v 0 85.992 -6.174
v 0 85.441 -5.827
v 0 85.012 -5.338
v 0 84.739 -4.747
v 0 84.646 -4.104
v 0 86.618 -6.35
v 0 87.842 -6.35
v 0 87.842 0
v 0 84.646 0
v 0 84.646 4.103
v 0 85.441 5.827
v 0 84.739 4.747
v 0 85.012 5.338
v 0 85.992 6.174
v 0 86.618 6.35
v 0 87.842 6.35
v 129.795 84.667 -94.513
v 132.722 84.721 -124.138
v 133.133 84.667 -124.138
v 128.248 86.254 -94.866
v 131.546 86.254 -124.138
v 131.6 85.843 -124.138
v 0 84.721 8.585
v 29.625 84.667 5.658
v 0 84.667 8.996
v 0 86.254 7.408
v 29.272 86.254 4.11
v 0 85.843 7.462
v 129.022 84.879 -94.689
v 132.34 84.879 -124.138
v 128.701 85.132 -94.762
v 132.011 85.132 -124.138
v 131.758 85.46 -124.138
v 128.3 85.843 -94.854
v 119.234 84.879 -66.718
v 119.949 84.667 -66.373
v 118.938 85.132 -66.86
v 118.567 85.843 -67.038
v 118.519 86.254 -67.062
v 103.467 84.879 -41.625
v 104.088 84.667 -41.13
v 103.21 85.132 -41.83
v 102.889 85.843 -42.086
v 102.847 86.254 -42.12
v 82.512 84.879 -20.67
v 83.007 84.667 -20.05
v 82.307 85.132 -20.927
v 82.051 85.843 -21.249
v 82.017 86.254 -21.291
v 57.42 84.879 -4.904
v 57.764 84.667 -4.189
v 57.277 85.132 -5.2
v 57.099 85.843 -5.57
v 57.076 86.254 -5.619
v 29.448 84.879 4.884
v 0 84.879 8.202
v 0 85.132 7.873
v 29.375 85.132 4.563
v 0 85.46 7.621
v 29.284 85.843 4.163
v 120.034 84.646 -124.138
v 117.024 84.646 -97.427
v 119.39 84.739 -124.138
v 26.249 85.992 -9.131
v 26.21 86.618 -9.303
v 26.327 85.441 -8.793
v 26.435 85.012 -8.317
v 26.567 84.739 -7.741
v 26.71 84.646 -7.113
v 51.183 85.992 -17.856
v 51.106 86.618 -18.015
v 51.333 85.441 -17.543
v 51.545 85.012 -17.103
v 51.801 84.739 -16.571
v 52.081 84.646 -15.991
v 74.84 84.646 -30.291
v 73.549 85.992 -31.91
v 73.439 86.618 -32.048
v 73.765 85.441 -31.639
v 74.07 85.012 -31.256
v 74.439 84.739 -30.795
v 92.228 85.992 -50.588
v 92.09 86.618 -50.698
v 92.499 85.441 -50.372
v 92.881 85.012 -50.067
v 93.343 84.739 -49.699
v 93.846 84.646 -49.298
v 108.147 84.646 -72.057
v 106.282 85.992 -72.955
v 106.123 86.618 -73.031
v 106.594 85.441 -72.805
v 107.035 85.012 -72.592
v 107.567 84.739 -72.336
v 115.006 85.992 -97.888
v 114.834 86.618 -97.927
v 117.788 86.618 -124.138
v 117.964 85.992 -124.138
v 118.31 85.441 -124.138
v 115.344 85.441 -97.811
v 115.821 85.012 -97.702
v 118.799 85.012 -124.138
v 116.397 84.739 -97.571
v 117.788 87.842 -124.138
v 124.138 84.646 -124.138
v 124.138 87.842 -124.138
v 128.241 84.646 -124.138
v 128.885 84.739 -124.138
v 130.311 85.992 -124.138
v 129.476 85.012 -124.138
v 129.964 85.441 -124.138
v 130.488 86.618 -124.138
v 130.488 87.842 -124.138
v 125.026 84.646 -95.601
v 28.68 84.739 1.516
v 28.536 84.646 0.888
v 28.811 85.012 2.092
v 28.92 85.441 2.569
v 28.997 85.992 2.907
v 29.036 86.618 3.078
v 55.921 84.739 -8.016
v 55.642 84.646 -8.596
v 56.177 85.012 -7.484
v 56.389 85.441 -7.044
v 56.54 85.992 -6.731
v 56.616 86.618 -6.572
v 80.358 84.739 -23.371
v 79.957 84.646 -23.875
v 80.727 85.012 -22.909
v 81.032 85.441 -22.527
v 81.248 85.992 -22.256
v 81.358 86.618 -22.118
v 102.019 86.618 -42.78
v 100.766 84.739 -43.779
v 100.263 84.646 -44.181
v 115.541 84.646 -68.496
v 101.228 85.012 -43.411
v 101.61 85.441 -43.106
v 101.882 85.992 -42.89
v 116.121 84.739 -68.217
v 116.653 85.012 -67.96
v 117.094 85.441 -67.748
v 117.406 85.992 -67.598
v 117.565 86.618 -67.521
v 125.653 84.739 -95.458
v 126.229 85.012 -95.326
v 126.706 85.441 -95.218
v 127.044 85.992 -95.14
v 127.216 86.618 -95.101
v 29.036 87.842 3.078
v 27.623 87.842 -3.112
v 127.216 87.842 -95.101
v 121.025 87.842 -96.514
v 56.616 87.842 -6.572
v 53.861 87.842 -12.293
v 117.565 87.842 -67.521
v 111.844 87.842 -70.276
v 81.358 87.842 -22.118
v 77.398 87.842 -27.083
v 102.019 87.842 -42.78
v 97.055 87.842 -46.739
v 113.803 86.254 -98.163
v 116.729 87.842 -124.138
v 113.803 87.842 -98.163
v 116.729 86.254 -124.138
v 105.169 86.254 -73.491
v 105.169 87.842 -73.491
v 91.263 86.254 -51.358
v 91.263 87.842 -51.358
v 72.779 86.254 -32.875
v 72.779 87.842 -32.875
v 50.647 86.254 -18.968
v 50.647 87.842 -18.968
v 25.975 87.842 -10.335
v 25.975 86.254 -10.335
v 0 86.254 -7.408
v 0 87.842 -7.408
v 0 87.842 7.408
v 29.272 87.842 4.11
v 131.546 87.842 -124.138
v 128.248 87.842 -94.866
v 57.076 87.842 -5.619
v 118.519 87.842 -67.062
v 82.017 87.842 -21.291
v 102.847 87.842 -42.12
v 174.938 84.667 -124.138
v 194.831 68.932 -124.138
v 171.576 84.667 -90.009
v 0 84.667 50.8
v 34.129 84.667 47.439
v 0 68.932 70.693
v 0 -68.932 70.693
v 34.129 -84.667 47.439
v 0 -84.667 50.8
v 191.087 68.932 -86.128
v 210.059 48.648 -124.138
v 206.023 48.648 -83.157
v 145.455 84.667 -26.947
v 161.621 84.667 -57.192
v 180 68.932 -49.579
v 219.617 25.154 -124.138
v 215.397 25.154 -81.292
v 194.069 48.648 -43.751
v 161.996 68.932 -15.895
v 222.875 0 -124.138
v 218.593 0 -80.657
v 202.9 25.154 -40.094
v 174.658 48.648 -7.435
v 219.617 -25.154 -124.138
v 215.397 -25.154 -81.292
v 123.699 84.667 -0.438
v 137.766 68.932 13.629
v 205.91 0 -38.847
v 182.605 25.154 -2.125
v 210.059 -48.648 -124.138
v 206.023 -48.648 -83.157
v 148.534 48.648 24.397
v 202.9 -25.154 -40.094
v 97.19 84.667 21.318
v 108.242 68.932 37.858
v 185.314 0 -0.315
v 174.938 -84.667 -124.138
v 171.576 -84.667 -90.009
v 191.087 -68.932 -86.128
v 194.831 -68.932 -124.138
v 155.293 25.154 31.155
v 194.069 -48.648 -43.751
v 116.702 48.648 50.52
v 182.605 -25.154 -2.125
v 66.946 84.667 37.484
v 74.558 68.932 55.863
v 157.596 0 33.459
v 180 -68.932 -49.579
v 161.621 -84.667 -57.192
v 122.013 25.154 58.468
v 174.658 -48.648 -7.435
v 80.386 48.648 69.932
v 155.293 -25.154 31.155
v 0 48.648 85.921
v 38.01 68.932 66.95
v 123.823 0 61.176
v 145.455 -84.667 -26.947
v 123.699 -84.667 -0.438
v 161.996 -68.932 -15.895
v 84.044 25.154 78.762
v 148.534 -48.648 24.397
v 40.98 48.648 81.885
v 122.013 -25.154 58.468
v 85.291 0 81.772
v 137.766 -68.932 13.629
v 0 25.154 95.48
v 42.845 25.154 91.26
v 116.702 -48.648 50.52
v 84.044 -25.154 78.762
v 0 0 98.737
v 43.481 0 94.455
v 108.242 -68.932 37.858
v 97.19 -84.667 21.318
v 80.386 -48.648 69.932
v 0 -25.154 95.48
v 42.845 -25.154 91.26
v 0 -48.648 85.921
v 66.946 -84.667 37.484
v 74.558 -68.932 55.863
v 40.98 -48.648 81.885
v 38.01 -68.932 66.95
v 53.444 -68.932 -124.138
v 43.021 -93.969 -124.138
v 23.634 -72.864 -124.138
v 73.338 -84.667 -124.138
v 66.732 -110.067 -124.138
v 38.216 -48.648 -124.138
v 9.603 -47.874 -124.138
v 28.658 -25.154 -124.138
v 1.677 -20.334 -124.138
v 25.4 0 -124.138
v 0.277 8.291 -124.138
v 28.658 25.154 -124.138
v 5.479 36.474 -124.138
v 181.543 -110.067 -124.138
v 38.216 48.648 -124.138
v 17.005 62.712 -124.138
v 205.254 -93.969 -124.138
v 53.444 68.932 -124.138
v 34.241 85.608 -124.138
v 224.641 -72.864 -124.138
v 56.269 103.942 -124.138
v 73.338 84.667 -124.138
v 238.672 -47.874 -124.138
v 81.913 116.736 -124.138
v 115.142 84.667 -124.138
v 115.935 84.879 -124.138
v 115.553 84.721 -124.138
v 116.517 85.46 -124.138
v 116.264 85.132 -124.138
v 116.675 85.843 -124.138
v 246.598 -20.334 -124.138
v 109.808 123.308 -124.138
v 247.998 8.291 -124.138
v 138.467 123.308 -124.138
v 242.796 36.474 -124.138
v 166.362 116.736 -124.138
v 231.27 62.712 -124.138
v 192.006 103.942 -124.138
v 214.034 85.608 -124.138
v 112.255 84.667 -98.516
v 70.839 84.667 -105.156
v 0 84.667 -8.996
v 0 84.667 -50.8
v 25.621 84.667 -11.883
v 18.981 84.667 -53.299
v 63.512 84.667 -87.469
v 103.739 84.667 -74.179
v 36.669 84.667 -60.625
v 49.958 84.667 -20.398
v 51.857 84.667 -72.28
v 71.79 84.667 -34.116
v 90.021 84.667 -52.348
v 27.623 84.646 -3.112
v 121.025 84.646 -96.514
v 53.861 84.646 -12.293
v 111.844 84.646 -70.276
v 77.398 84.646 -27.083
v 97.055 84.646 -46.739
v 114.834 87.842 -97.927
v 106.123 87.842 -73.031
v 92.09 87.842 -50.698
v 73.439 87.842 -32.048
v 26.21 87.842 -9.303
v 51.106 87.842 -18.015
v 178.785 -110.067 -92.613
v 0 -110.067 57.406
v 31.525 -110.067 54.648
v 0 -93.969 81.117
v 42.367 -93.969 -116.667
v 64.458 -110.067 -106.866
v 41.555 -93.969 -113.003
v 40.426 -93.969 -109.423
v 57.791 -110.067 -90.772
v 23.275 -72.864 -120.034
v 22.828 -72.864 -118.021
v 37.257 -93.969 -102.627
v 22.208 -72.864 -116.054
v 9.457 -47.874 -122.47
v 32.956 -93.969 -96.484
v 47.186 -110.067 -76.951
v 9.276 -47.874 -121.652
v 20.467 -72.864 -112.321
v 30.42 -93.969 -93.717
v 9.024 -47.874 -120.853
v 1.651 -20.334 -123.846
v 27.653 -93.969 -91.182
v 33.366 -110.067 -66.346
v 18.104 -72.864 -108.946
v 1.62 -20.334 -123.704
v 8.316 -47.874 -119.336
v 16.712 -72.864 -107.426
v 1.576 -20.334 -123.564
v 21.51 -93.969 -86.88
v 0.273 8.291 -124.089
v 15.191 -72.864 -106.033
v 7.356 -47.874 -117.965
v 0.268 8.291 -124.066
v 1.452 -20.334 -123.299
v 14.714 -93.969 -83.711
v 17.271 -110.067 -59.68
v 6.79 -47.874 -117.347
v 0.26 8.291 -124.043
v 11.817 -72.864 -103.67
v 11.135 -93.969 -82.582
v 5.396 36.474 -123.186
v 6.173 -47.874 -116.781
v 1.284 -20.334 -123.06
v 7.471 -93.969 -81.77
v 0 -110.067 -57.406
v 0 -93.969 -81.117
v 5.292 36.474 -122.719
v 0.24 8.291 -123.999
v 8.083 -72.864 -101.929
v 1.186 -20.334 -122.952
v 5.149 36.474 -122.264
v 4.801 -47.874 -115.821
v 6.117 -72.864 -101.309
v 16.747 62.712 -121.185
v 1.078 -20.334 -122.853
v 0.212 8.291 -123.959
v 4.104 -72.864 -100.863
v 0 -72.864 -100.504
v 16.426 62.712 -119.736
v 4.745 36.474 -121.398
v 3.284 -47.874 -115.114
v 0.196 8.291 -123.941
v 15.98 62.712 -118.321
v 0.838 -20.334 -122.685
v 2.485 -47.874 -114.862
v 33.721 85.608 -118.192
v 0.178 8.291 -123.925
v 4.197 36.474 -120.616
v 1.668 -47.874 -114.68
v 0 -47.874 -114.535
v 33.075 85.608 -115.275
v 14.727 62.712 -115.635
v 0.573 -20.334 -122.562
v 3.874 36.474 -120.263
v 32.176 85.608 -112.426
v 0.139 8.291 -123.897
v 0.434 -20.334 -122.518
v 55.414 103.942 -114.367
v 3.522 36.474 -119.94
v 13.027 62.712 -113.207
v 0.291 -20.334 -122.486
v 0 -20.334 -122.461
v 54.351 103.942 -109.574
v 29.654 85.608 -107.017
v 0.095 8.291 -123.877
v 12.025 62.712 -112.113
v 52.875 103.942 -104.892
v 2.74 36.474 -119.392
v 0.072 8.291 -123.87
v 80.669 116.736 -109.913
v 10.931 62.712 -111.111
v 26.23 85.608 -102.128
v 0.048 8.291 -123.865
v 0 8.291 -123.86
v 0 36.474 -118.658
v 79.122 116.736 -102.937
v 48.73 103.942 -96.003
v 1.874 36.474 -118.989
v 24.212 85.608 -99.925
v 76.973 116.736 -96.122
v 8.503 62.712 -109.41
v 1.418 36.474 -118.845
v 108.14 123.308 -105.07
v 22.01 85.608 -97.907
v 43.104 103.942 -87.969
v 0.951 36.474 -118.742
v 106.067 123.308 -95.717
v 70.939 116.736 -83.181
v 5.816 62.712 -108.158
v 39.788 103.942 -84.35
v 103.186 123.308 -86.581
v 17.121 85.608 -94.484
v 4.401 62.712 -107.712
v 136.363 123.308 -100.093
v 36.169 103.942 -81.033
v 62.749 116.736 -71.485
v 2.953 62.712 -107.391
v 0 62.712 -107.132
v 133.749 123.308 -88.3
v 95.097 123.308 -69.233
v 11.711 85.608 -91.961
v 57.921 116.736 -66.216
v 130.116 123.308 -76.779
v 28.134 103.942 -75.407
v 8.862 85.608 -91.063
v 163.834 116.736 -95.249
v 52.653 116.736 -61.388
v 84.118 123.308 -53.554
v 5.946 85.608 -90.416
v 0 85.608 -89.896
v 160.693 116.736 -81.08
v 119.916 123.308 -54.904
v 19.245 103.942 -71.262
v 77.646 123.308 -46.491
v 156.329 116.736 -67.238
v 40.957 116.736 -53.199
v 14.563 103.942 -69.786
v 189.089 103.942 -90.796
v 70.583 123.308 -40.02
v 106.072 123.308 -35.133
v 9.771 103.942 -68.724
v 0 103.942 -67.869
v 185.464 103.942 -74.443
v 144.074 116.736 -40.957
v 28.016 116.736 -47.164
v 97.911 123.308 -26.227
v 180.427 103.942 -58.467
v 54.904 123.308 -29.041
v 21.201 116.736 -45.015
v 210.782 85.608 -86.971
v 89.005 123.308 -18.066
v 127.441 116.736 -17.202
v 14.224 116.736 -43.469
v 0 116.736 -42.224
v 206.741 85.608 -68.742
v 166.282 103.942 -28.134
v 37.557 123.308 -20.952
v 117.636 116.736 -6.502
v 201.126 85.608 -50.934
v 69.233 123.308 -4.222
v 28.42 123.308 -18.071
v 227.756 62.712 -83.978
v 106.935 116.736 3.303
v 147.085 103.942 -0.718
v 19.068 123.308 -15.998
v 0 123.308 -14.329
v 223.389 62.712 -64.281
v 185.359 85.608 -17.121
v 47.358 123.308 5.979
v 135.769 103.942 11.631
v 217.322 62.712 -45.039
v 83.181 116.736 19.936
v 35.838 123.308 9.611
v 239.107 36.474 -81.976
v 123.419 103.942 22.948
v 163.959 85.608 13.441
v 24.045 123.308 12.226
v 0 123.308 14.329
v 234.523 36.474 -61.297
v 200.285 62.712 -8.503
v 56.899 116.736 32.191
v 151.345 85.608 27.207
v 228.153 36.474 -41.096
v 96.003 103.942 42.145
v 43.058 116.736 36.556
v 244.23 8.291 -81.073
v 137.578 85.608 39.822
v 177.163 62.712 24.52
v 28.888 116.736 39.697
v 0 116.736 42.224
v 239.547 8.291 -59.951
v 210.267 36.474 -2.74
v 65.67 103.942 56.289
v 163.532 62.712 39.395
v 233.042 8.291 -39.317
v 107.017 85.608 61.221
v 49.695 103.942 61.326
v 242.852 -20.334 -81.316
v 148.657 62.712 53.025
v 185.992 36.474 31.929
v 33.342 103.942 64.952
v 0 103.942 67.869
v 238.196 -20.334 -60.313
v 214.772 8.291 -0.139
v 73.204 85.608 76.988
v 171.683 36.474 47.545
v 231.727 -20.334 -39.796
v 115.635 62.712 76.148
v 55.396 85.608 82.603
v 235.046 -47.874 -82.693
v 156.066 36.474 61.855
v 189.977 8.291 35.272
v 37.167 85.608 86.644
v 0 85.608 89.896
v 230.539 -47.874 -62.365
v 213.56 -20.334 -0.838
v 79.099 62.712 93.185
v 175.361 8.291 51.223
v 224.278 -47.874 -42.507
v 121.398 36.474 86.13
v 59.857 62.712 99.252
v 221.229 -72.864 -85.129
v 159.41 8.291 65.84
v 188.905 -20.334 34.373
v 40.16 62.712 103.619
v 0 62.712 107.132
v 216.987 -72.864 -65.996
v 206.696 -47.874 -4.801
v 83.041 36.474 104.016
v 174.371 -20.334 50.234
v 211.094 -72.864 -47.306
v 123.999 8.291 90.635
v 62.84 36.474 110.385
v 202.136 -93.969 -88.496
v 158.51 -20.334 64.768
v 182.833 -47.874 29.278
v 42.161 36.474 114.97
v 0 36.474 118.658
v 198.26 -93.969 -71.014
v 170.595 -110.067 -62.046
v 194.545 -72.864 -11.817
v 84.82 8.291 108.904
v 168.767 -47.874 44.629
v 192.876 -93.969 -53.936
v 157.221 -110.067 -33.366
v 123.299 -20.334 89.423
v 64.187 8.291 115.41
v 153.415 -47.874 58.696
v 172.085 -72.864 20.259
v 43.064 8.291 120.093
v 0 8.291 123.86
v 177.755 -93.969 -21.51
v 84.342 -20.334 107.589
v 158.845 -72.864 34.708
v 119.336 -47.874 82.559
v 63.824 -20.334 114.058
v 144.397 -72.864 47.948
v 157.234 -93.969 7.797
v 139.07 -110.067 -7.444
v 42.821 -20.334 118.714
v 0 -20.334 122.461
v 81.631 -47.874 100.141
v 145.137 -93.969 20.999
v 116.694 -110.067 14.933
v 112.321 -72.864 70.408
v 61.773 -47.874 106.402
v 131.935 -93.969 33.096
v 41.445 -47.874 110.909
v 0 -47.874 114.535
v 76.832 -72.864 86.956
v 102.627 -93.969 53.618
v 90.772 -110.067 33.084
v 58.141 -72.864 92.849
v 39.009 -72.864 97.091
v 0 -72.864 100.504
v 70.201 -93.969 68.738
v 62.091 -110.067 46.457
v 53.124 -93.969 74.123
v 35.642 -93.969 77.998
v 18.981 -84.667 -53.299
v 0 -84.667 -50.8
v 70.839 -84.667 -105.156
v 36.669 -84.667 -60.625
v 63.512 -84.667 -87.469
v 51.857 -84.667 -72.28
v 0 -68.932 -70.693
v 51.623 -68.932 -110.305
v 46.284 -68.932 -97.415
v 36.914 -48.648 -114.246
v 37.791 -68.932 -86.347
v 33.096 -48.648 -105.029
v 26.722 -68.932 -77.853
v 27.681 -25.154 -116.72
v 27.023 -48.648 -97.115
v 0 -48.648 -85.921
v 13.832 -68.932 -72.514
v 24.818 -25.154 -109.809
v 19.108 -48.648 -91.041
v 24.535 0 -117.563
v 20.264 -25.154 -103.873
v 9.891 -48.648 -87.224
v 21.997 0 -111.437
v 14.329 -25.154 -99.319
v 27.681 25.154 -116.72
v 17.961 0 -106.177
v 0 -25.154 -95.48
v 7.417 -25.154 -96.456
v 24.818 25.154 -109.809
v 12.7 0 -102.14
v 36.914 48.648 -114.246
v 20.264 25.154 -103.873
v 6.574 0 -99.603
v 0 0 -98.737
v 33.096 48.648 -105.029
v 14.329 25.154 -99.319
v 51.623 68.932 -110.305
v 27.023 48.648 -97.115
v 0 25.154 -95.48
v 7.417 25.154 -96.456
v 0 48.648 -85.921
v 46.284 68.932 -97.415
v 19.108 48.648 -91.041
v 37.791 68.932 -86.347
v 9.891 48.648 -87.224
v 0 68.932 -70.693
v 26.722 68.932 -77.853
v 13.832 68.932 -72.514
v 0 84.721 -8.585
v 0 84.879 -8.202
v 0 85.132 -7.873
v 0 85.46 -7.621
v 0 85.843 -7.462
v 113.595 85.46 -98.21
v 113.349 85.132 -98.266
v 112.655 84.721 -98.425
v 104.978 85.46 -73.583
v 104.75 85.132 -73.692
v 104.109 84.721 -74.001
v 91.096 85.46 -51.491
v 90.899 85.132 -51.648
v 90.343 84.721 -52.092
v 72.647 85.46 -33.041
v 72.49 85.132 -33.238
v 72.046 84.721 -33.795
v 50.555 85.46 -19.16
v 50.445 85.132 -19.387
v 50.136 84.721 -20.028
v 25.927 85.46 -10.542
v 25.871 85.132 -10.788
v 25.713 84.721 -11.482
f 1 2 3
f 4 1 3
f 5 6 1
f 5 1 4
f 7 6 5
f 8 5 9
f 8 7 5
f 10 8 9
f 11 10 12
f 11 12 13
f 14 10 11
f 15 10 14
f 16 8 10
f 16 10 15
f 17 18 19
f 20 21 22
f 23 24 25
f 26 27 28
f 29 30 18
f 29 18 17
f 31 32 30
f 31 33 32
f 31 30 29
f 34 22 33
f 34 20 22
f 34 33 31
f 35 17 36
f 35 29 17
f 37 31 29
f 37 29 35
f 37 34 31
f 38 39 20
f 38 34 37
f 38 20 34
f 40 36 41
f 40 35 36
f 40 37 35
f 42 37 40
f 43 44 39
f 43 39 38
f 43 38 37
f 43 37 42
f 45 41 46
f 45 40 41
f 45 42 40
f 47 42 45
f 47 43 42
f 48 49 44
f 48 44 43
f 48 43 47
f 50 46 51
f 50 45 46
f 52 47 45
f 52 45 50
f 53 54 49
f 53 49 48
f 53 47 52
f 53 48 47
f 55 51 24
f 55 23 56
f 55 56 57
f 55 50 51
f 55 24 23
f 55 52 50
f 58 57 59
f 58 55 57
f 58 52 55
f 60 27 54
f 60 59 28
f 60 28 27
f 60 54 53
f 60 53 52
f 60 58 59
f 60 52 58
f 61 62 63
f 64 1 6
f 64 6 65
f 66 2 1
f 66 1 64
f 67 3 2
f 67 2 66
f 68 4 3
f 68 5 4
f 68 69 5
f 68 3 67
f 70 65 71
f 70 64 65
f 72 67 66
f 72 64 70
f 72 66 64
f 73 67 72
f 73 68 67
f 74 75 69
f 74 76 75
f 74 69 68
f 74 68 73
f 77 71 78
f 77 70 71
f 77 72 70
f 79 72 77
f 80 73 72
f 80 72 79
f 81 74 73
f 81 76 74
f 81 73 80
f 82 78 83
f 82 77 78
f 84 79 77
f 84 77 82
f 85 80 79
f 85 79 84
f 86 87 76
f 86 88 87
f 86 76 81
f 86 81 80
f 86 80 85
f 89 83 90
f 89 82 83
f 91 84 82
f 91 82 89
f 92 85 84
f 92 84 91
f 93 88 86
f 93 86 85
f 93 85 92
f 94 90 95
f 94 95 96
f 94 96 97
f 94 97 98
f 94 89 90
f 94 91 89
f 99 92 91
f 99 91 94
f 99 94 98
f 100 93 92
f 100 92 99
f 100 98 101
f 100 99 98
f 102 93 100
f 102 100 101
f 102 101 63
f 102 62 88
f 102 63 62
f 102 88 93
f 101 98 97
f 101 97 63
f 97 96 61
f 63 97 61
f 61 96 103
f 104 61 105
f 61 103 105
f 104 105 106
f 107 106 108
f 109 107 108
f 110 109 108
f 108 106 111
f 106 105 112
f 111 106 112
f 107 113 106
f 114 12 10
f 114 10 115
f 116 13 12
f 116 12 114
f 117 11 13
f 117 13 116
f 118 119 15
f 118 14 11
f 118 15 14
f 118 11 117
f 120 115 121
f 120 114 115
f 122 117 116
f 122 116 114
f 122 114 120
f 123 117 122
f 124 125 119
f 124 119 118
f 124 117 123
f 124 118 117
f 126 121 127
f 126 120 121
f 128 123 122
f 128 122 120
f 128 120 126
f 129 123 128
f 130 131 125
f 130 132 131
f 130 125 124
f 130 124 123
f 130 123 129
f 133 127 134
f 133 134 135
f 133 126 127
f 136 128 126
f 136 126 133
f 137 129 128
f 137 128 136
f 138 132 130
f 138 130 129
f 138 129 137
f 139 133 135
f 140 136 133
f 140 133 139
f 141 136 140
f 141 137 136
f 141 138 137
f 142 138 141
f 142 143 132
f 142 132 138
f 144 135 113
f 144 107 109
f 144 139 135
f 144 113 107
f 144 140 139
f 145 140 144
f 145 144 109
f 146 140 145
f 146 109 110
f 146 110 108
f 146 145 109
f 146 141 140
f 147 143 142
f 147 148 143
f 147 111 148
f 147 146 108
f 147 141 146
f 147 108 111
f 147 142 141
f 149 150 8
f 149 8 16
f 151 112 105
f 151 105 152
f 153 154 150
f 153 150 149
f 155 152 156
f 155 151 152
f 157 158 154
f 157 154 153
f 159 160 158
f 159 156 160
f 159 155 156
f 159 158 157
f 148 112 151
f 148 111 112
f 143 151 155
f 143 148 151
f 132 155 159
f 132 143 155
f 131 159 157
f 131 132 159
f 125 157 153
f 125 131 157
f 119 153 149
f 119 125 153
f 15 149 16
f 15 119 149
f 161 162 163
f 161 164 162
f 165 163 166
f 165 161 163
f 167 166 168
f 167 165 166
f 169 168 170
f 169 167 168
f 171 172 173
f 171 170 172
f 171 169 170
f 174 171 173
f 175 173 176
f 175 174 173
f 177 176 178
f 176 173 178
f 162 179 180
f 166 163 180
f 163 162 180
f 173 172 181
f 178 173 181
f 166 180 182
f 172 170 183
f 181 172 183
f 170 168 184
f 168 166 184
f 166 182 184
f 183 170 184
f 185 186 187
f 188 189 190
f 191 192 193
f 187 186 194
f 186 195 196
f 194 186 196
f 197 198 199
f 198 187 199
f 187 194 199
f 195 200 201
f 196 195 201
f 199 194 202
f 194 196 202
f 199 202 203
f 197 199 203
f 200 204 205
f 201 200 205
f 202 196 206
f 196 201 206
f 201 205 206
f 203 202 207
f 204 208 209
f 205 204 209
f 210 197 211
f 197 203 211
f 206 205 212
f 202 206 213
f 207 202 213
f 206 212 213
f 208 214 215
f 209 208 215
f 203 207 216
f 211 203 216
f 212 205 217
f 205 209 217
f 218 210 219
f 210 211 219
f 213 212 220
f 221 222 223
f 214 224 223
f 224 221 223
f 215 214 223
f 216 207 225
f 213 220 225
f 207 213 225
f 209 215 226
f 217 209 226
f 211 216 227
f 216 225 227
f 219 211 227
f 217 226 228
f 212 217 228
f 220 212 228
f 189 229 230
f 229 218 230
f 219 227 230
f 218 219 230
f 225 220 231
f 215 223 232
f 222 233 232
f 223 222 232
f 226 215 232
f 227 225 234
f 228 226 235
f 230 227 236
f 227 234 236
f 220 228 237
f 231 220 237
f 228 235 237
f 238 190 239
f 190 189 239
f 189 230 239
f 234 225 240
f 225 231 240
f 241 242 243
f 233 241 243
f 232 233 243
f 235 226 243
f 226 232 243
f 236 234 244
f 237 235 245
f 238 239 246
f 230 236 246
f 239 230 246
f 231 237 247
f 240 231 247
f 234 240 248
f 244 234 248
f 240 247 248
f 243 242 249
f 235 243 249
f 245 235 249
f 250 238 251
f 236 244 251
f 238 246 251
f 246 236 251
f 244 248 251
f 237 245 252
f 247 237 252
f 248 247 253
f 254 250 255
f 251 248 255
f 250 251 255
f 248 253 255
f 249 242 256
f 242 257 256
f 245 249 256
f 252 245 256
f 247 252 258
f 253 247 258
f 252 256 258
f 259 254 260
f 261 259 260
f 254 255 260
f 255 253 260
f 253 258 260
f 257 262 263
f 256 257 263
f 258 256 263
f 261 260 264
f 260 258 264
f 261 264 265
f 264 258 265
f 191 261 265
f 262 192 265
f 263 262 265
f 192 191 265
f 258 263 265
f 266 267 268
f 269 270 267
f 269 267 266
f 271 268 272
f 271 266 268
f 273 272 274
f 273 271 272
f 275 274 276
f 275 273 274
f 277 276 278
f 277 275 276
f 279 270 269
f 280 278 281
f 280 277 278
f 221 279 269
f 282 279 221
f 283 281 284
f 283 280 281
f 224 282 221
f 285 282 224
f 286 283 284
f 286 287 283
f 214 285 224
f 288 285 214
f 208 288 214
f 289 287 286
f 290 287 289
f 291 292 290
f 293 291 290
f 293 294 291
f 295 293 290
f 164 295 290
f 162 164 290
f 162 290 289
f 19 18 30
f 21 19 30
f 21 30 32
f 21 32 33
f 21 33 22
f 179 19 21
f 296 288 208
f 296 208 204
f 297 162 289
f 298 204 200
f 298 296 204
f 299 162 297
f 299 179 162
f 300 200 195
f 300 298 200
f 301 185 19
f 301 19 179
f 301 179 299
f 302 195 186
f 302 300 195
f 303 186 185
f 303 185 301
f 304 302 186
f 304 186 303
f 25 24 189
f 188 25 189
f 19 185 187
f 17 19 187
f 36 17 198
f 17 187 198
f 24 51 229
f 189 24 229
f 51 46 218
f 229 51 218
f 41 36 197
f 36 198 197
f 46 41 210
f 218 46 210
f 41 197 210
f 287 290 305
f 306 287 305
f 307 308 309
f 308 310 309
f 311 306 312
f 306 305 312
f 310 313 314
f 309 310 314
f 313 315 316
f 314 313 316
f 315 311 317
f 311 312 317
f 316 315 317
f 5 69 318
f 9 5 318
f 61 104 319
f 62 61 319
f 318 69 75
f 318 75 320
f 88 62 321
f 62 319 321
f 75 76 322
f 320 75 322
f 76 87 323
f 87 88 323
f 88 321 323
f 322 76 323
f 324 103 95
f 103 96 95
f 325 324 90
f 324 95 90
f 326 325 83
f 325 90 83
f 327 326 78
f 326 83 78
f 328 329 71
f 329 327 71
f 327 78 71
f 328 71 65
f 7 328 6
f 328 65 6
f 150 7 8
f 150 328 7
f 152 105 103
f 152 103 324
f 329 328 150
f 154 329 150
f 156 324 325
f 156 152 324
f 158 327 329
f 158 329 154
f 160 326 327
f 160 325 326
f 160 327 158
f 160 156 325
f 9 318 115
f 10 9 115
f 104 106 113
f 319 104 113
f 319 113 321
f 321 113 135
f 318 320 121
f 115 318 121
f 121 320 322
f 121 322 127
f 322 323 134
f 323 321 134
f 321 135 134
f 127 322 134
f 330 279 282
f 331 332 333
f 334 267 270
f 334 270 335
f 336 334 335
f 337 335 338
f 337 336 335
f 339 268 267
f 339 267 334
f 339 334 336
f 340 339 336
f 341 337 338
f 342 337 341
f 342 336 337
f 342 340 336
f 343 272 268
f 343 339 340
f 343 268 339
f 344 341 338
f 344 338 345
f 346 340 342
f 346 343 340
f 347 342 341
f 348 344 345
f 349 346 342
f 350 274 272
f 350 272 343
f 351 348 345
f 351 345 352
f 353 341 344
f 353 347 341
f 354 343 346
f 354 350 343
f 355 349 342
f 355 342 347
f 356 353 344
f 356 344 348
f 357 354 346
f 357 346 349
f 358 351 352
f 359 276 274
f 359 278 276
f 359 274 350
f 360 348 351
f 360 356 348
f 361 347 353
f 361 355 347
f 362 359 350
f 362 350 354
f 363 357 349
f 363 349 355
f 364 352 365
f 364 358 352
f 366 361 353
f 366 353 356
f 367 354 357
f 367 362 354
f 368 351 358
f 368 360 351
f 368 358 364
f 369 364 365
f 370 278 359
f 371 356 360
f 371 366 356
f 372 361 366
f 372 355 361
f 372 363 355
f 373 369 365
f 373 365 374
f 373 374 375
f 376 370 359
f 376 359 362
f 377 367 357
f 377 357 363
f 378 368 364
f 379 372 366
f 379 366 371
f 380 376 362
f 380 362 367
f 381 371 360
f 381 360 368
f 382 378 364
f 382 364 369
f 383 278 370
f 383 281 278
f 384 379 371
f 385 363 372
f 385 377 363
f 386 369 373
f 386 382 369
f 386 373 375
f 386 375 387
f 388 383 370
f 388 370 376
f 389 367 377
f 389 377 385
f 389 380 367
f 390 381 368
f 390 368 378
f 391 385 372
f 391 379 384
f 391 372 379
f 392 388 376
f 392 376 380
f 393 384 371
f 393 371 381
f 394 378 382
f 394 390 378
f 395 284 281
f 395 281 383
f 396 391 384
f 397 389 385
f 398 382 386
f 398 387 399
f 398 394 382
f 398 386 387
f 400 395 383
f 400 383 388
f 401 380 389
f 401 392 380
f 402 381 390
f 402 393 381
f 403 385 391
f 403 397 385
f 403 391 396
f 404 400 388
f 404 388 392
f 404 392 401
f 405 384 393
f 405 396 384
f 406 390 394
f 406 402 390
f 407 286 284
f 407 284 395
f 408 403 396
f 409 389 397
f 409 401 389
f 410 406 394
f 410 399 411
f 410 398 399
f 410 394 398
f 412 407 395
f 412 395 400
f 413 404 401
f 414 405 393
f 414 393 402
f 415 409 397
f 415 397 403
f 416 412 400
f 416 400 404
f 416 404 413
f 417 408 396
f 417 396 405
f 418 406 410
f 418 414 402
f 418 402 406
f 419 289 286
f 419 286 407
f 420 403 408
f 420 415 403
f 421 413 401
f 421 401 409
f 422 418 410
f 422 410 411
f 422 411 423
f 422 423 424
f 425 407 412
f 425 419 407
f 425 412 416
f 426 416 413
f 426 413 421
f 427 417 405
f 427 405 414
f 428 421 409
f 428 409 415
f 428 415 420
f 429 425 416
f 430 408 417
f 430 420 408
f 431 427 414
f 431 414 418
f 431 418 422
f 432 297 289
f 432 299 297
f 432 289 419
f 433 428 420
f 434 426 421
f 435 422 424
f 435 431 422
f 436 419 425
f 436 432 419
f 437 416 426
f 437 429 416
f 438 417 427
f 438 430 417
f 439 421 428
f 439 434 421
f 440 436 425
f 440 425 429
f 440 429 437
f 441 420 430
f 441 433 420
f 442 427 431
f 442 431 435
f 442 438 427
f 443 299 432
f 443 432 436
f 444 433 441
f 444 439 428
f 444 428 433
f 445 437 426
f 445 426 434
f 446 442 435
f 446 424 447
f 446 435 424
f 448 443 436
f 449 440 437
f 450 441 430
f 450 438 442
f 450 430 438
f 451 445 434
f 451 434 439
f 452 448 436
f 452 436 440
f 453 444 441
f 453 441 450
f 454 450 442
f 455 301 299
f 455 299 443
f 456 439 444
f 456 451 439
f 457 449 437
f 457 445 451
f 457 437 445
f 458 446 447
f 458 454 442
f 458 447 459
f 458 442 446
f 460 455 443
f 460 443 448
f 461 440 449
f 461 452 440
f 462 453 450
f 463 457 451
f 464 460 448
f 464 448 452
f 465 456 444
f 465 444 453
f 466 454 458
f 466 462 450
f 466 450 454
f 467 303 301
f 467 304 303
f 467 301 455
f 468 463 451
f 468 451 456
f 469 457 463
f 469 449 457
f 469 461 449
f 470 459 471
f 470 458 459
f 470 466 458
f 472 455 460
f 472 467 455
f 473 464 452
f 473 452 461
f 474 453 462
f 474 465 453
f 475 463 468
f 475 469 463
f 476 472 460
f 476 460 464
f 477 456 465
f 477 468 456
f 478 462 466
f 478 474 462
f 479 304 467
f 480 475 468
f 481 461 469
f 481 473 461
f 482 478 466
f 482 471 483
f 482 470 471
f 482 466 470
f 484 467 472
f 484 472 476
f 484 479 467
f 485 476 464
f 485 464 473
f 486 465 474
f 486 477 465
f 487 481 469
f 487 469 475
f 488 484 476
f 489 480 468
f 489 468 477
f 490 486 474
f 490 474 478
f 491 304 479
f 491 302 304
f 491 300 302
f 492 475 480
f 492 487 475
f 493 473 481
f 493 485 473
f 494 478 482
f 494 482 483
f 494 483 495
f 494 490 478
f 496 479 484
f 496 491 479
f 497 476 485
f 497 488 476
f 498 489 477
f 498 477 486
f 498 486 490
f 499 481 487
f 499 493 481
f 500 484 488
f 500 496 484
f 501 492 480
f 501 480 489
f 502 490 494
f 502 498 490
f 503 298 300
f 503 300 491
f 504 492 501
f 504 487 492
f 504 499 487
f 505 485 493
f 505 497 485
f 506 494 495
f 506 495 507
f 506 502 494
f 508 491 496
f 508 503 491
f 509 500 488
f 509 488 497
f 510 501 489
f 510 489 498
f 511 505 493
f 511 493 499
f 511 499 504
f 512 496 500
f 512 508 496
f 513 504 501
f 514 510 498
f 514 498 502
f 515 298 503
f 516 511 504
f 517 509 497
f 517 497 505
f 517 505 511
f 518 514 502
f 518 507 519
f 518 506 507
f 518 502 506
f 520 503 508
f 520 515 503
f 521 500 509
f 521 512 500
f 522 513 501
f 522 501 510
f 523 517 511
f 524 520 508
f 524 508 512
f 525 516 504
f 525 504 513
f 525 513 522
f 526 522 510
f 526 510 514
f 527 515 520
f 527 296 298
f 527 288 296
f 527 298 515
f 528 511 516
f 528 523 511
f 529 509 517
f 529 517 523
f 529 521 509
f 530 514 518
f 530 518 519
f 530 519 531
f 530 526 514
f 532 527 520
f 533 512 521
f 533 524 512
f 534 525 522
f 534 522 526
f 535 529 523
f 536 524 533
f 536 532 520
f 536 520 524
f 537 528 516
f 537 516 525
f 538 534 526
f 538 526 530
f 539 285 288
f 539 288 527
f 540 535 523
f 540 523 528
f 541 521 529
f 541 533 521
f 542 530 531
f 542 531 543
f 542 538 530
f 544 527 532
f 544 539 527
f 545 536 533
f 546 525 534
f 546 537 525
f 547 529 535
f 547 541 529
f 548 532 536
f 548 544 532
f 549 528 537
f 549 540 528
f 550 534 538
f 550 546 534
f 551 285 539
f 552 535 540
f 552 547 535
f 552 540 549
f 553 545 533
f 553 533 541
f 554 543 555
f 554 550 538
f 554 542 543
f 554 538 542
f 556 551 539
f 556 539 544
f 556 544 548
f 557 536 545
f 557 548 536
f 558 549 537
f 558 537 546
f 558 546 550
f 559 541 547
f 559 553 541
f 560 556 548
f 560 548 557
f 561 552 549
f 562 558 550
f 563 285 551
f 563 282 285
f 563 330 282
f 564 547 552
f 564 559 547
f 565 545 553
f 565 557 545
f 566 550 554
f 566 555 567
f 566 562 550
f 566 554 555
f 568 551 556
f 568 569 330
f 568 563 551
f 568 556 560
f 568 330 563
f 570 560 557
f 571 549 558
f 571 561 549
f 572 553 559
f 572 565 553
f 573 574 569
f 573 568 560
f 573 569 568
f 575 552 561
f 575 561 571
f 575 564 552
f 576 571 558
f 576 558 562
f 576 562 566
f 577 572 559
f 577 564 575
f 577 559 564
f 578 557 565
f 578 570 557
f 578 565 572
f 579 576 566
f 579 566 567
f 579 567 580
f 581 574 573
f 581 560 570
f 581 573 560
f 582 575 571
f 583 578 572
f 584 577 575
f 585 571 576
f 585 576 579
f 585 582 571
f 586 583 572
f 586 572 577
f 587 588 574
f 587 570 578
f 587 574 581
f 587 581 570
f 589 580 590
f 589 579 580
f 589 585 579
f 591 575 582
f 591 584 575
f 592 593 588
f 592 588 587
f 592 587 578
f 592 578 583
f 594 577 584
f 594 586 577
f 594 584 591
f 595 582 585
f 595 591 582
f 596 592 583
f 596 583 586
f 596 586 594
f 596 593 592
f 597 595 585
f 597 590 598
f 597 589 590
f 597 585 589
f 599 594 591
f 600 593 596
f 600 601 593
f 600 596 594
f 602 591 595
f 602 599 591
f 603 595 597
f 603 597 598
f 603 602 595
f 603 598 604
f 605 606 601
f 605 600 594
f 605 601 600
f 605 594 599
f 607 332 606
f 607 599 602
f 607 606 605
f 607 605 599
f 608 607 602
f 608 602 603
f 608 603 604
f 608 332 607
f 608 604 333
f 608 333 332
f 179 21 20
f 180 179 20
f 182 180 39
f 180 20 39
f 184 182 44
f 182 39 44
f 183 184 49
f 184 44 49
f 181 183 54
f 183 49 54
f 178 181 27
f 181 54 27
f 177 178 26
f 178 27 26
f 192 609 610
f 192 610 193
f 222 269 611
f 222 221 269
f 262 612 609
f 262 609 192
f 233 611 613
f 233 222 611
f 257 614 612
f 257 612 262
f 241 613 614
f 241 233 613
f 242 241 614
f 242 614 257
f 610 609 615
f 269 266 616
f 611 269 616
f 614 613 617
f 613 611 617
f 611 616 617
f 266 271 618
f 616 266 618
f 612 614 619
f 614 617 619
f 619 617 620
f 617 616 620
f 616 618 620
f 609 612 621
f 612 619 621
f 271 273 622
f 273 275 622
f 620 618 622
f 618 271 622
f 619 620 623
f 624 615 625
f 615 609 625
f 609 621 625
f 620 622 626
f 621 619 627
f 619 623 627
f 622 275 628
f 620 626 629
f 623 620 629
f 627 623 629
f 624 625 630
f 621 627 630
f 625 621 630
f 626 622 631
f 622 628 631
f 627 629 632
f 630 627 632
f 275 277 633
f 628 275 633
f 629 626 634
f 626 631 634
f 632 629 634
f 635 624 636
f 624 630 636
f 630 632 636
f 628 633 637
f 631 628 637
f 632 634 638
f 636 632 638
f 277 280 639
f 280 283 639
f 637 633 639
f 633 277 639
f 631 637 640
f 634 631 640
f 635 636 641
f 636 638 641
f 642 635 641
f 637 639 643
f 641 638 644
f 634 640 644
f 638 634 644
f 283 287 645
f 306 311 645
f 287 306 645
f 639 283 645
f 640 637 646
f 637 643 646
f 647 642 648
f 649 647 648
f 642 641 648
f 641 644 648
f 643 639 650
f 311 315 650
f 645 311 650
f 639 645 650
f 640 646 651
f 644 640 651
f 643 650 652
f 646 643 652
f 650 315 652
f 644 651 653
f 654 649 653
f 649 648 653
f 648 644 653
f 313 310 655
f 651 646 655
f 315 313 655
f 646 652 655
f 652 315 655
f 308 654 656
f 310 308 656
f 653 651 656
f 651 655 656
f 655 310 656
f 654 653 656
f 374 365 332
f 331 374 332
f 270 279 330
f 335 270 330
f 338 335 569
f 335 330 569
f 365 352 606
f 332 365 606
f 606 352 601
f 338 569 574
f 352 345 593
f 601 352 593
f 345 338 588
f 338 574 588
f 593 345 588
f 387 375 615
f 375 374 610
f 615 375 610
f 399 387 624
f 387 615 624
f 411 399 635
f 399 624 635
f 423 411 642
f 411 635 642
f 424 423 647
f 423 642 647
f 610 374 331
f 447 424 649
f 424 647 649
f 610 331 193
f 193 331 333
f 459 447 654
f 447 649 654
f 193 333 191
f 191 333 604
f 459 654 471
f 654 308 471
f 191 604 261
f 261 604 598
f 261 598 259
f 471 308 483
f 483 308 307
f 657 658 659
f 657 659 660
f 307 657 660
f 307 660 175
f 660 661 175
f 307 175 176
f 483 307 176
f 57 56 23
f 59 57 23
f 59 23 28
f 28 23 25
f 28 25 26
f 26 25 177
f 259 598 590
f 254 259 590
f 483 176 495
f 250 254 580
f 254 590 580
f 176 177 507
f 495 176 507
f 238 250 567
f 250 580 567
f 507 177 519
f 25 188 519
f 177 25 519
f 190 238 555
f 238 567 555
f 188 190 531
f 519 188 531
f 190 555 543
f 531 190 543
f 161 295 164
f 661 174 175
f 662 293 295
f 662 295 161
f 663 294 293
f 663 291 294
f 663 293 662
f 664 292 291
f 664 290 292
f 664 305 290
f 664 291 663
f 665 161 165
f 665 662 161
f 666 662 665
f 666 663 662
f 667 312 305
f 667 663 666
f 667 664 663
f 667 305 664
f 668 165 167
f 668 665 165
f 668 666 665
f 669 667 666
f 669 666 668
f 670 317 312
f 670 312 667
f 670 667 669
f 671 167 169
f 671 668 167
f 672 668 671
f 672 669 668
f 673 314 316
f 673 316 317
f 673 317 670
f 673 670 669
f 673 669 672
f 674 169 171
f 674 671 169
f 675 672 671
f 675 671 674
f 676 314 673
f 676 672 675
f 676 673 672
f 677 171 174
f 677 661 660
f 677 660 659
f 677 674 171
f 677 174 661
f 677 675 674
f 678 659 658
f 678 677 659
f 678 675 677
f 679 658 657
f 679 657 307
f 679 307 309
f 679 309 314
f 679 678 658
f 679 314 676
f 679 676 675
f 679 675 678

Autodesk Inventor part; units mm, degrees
ref_plane "YZ Plane" through (0, 0, 0) normal (1, 0, 0) x (0, 1, 0)
ref_plane "XZ Plane" through (0, 0, 0) normal (0, 1, 0) x (-1, 0, 0)
ref_plane "XY Plane" through (0, 0, 0) normal (0, 0, 1) x (1, 0, 0)
sketch "Sketch1" plane through (0, 0, 0) normal (1, 0, 0) x (0, 1, 0)
  line L0 (-84.6667, 50.8) -> (-84.6667, -50.8)
  arc A0 (-110.0667, -57.4059) -> (-110.0667, 57.4059) centre (0, 0) ccw
  arc A1 (84.6667, 50.8) -> (-84.6667, 50.8) centre (0, 0) ccw
  arc A2 (-84.6667, -50.8) -> (84.6667, -50.8) centre (0, 0) ccw
  line L1 (130.9567, -124.1375) -> (-138.9472, -124.1375) construction
  line L2 (-110.0667, -57.4059) -> (-110.0667, 57.4059)
  line L3 (84.6667, 8.9958) -> (84.6667, -8.9958) construction
  arc A3 (84.6667, 8.9958) -> (86.2542, 7.4083) centre (86.2542, 8.9958) ccw
  arc A4 (86.2542, -7.4083) -> (84.6667, -8.9958) centre (86.2542, -8.9958) ccw
  line L4 (84.6667, 0) -> (87.8417, 0) construction
  line L5 (87.8417, 7.4083) -> (86.2542, 7.4083)
  line L6 (87.8417, -7.4083) -> (86.2542, -7.4083)
  line L7 (87.8417, 7.4083) -> (87.8417, -7.4083)
  line L8 (84.6667, -50.8) -> (84.6667, -8.9958)
  line L9 (84.6667, 8.9958) -> (84.6667, 50.8)
  point P0 (84.6667, 0)
  dimension "d1" = 101.6
  dimension "d11" = 25.4
  dimension "d16" = 14.8167
  dimension "d17" = 1.5875
  dimension "d18" = 1.5875
revolve "corridor" add sketch "Sketch1" angle 90 about axis through (0, 130.9567, -124.1375) along (0, 1, 0)
sketch "Sketch4" plane through (0, -110.0667, -57.4059) normal (-1, 0, 0) x (0, 0, 1)
  line L0 (51.0559, 197.9083) -> (57.4059, 197.9083)
  line L1 (64.8142, 197.9083) -> (49.9976, 197.9083)
  line L2 (51.0559, 197.9083) -> (51.0559, 196.6845)
  line L3 (53.3024, 194.7127) -> (57.4059, 194.7127)
  line L4 (57.4059, 194.7127) -> (57.4059, 197.9083) construction
  line L5 (51.0574, 194.7333) -> (54.2316, 197.9076) construction
  arc A0 (54.2323, 194.7127) -> (51.0559, 197.9083) centre (51.0574, 194.7333) ccw construction
  arc A1 (51.0559, 196.6845) -> (53.3024, 194.7127) centre (53.3024, 196.9784) ccw
  line L6 (63.7559, 197.9083) -> (57.4059, 197.9083)
  line L7 (63.7559, 197.9083) -> (63.7559, 196.6845)
  line L8 (61.5093, 194.7127) -> (57.4059, 194.7127)
  line L9 (63.7544, 194.7333) -> (60.5801, 197.9076) construction
  arc A2 (63.7559, 197.9083) -> (60.5795, 194.7127) centre (63.7544, 194.7333) ccw construction
  arc A3 (61.5093, 194.7127) -> (63.7559, 196.6845) centre (61.5093, 196.9784) ccw
  line L10 (64.8142, 197.9083) -> (-66.7316, 197.9083) projected
  line L11 (49.9976, 196.3208) -> (49.9976, 197.9083) projected
  line L12 (-66.7316, 234.2041) -> (-66.7316, 0) construction
  line L13 (-66.7316, 234.2041) -> (-66.7316, 0)
  point P0 (57.4059, 110.0667)
  point P1 (57.4059, 197.9083)
  point P2 (-66.7316, 110.0667)
  dimension "d20" = 6.35
  dimension "d21" = 3.175
  dimension "d22" = 45
  dimension "d23" = 2.2657
  dimension "d24" = 2.2466
revolve "light" add sketch "Sketch4" angle 90 about axis through (0, 124.1375, -124.1375) along (0, 1, 0) separate body
equation "\"d17\" = 0.5 * d19"
equation "\"d19\" = 3.175"
properties part number "corridor turn"
